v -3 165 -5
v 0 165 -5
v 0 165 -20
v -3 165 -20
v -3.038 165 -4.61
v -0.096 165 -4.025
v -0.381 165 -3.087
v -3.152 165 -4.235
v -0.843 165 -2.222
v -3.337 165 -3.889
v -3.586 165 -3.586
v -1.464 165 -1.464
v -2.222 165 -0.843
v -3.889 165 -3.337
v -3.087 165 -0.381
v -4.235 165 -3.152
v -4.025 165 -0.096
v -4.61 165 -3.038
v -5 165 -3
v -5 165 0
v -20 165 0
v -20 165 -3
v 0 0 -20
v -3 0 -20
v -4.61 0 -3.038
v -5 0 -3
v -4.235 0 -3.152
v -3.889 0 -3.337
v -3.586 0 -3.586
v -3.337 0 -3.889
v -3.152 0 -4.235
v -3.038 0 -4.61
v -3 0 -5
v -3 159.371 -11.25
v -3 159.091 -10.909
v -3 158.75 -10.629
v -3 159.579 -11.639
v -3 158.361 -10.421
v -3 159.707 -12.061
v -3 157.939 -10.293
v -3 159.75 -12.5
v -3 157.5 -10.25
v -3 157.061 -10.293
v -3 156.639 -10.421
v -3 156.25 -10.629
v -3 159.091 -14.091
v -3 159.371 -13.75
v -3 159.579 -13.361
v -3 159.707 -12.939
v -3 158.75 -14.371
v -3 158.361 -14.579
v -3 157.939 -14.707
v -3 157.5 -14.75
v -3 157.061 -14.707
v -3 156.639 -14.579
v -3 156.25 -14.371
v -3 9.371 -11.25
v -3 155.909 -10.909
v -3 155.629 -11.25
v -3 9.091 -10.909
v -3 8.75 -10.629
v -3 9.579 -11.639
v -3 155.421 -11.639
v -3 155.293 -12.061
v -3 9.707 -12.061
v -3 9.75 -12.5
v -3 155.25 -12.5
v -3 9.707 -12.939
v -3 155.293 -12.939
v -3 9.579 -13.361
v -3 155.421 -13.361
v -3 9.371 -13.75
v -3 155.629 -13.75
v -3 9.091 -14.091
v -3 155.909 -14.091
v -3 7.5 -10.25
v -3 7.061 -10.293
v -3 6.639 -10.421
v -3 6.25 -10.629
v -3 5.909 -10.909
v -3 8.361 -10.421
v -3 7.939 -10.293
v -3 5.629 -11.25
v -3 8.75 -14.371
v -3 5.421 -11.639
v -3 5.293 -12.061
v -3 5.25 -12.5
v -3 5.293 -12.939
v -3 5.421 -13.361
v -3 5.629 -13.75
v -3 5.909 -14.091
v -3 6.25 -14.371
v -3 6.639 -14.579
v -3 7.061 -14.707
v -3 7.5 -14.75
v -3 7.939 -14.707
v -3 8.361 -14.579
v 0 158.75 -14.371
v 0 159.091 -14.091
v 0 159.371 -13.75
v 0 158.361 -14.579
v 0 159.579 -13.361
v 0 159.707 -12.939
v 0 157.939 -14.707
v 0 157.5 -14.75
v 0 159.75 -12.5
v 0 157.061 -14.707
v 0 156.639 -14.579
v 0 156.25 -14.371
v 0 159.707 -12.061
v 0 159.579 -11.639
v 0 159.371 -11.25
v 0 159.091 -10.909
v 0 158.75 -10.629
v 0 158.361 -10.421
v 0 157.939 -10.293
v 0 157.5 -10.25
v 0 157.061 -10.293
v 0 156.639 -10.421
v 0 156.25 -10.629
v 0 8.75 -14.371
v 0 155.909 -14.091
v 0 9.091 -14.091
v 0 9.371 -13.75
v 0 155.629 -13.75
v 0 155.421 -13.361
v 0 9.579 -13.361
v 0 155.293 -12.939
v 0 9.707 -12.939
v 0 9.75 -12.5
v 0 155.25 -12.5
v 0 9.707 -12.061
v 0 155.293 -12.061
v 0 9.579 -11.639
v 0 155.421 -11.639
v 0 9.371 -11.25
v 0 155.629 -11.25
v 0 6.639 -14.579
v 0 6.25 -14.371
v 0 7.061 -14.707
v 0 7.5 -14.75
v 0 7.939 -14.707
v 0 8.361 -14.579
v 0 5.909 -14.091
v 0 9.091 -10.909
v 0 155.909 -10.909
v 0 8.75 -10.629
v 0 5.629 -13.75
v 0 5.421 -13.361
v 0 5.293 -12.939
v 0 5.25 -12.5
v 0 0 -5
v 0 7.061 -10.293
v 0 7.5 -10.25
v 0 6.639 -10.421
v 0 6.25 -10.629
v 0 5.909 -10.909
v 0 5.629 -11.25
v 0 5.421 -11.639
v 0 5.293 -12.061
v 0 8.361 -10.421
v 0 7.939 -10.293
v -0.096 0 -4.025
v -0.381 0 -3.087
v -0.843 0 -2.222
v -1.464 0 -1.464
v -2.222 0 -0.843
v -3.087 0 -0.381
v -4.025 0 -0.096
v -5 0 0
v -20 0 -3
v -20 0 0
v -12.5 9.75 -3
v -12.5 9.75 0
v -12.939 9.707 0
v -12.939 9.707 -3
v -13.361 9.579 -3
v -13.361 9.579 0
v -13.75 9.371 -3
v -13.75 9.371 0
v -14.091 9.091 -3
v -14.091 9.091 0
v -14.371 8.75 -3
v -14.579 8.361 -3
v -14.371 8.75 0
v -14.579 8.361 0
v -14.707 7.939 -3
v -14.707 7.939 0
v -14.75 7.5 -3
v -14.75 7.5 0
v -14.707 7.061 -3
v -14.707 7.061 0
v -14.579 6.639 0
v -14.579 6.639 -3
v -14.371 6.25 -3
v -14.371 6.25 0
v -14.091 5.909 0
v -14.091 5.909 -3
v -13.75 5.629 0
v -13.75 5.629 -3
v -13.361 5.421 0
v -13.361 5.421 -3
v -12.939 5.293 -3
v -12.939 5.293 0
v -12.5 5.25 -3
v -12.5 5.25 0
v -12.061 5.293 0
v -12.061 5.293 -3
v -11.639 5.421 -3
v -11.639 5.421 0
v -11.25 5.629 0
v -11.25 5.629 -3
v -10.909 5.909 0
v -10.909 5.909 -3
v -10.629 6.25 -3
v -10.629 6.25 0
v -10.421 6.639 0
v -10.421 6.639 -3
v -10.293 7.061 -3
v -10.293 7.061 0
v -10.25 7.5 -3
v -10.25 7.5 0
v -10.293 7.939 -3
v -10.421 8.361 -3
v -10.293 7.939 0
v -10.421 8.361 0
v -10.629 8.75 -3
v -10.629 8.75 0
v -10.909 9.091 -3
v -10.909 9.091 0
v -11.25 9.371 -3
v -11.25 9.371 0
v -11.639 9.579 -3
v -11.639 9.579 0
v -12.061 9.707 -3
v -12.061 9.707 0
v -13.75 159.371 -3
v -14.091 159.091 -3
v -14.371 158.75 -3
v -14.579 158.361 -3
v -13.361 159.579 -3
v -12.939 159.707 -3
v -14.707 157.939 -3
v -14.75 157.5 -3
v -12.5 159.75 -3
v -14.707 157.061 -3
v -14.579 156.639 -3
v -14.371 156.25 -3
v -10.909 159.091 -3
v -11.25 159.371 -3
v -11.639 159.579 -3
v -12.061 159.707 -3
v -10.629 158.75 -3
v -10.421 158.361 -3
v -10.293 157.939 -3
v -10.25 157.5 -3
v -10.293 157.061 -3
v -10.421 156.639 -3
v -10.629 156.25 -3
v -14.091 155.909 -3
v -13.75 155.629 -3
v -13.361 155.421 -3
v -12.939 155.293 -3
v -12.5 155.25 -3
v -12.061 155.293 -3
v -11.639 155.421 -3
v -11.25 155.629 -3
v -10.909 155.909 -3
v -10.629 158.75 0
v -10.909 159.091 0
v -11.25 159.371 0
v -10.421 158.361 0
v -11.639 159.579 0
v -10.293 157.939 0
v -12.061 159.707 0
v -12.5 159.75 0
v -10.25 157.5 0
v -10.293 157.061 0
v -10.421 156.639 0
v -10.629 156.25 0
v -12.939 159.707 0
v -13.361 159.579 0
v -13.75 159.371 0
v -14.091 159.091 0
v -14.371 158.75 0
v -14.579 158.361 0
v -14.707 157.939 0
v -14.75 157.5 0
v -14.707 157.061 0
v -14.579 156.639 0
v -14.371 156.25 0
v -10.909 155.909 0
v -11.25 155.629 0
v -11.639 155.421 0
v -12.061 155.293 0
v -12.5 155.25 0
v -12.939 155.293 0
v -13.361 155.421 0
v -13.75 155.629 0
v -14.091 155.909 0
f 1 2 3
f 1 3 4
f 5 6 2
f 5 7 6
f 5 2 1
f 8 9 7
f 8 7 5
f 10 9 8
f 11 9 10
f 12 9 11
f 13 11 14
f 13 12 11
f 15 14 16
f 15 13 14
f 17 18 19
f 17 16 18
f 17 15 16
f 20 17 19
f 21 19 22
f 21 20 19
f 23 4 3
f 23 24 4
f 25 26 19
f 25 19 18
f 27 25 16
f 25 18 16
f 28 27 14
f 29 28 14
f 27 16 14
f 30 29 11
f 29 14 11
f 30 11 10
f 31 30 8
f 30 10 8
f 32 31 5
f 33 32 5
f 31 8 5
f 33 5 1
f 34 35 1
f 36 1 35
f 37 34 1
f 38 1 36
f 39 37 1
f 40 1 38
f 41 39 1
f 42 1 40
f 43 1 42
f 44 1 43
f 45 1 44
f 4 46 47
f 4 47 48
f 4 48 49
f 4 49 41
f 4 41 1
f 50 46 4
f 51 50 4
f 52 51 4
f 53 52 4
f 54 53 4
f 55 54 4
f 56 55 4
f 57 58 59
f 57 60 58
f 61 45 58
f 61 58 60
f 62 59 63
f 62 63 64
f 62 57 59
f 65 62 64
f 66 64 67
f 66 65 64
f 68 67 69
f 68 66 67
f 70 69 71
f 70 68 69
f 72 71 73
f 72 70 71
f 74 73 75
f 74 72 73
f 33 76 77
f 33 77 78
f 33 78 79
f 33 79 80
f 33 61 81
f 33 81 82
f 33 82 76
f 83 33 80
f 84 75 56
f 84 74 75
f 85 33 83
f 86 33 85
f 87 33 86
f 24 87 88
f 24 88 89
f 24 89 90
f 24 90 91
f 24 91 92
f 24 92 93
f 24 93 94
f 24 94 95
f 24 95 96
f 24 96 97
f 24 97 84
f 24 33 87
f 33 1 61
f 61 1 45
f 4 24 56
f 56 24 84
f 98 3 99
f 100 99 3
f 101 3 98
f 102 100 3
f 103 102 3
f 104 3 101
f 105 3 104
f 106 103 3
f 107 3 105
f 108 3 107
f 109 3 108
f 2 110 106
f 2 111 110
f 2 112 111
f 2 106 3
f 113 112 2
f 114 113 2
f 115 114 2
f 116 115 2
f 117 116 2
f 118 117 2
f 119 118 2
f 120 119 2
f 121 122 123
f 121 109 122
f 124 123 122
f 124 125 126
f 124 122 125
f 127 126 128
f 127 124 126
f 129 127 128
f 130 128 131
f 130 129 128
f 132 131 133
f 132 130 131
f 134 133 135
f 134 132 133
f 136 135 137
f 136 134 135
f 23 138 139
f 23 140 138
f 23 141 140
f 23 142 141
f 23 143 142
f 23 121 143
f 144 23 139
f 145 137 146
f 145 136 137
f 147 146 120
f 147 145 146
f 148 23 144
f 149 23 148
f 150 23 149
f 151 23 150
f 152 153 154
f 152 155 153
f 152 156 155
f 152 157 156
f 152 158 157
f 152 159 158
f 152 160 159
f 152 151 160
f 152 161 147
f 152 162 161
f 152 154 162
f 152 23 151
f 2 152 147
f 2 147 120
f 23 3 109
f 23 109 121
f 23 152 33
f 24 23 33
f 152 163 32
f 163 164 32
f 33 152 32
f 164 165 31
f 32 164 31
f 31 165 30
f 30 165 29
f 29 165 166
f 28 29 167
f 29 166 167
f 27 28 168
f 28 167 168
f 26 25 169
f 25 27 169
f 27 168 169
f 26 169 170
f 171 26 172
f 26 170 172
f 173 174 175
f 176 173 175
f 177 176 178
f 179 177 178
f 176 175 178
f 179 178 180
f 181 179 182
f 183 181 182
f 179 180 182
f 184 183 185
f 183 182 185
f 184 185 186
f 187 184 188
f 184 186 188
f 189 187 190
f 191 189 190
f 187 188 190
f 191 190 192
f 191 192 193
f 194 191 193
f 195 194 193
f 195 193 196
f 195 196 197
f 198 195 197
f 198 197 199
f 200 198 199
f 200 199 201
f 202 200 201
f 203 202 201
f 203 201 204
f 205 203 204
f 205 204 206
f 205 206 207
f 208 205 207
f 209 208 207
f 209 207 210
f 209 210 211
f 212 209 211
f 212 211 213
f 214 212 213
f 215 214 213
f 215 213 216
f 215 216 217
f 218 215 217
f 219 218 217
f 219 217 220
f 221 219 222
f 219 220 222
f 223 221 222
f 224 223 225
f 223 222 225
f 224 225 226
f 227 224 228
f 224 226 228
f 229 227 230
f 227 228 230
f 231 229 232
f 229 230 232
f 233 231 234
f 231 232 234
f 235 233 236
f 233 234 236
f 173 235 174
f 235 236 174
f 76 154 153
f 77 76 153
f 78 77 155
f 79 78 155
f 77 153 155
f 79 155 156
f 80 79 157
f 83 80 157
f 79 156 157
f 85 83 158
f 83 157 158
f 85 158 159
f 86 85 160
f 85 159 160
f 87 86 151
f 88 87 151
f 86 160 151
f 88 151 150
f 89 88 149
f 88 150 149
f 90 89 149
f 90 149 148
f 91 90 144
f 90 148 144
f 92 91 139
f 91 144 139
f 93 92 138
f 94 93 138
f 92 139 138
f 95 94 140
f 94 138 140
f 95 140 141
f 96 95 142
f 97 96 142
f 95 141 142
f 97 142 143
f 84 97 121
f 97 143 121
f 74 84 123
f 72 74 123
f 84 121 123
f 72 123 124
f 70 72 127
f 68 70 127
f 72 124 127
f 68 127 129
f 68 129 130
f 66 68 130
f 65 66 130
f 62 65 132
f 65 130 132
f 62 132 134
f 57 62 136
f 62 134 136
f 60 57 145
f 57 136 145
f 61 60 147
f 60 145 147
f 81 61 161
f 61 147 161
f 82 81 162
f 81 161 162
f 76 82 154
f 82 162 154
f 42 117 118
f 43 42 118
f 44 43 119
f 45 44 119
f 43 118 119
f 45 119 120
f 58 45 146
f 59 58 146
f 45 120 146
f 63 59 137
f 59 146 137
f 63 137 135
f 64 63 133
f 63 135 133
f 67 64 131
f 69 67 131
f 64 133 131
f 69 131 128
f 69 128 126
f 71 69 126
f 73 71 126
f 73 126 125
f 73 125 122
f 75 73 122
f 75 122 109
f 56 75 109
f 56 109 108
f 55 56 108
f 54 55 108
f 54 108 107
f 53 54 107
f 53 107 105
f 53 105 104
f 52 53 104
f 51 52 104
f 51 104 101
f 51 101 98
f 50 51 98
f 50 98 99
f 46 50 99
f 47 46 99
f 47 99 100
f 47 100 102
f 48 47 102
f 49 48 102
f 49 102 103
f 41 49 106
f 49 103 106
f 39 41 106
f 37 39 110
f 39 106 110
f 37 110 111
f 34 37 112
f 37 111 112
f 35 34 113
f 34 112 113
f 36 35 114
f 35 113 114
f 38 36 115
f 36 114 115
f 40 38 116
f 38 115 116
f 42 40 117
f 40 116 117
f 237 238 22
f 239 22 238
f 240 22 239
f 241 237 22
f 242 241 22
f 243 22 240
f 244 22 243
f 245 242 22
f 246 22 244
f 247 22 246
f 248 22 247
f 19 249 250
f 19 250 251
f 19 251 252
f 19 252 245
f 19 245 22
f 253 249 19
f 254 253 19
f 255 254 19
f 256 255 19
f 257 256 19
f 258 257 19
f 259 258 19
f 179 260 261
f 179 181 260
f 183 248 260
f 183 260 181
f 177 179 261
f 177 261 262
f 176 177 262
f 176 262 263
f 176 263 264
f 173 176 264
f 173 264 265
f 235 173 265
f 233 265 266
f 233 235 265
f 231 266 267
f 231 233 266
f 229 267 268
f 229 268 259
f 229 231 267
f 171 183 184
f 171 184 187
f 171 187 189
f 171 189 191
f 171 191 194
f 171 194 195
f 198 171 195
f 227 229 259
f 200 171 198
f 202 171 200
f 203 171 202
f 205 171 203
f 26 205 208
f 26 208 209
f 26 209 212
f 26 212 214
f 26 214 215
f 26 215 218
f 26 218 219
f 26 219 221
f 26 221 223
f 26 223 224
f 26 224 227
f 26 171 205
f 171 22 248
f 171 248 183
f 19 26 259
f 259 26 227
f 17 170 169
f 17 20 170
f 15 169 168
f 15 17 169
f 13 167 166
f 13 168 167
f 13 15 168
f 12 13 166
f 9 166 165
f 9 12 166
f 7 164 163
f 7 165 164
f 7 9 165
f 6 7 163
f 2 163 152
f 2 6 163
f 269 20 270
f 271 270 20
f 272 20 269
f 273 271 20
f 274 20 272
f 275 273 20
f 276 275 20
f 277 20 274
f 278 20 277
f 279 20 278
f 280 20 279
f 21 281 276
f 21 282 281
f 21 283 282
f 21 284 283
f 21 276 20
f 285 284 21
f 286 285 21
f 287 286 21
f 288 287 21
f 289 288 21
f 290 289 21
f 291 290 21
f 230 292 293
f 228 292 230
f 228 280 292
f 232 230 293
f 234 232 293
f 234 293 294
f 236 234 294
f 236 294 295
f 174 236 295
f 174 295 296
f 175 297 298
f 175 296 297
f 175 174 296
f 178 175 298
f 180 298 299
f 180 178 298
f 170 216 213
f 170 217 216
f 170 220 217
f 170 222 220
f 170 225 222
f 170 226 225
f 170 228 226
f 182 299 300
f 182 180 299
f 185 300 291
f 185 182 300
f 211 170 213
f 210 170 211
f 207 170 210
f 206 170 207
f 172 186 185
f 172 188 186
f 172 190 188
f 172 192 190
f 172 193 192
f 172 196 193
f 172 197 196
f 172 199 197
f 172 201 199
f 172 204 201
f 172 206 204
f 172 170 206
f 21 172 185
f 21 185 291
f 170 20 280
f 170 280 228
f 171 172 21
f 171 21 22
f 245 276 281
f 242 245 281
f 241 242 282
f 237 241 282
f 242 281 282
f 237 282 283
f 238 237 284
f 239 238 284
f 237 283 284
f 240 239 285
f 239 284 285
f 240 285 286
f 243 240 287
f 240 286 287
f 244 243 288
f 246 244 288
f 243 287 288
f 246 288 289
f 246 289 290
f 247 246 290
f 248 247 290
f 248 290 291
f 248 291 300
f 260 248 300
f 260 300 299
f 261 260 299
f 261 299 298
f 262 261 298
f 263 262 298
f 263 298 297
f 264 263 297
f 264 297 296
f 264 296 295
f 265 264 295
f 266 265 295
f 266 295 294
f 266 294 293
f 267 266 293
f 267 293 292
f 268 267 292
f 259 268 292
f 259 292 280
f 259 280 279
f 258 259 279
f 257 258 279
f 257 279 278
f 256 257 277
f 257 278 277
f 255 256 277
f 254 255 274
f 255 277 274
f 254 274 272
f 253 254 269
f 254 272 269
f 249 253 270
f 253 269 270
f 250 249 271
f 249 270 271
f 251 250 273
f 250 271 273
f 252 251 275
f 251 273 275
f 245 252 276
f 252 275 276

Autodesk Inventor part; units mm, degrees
ref_plane "YZ Plane" through (0, 0, 0) normal (1, 0, 0) x (0, 1, 0)
ref_plane "XZ Plane" through (0, 0, 0) normal (0, 1, 0) x (-1, 0, 0)
ref_plane "XY Plane" through (0, 0, 0) normal (0, 0, 1) x (1, 0, 0)
sketch "Sketch1" plane through (0, 0, 0) normal (0, 1, 0) x (-1, 0, 0)
  line L0 (0, 0) -> (20, 0)
  line L1 (20, 0) -> (20, -3)
  line L2 (20, -3) -> (0, -3)
  line L3 (0, -3) -> (0, 0)
  line L4 (0, 0) -> (3, 0)
  line L5 (3, 0) -> (3, -20)
  line L6 (3, -20) -> (0, -20)
  line L7 (0, -20) -> (0, 0)
  dimension "d0" = 3
  dimension "d1" = 3
  dimension "d2" = 20
  dimension "d3" = 20
extrude "Extrusion1" add sketch "Sketch1" along normal blind 165
fillet "Fillet1" radius 2 1 edges at (-3, 82.5, -3)
fillet "Fillet2" radius 5 1 edges at (0, 82.5, 0)
sketch "Sketch2" plane through (-3, 0, -20) normal (-1, 0, 0) x (0, 0, 1)
  line L0 (0, 165) -> (15, 165) projected
  line L1 (0, 0) -> (15, 0) projected
  line L2 (0, 0) -> (0, 165) projected
  point P0 (20, 0)
  point P1 (7.5, 157.5)
  point P2 (7.5, 7.5)
  dimension "d8" = 7.5
  dimension "d9" = 7.5
  dimension "d10" = 150
  dimension "d11" = 7.5
hole "Hole1" at (-3, 157.5, -12.5) at (-3, 7.5, -12.5) direction (1, 0, 0) diameter 4.5 end through all clearance for "Socket Head Cap Screw" size "M4" standard "Ansi Metric M Profile"
sketch "Sketch3" plane through (-20, 0, -3) normal (0, 0, -1) x (-1, 0, 0)
  line L0 (-15, 165) -> (0, 165) projected
  line L1 (-15, 0) -> (0, 0) projected
  line L2 (0, 0) -> (0, 165) projected
  point P0 (-20, 0)
  point P1 (-7.5, 157.5)
  point P2 (-7.5, 7.5)
  dimension "d19" = 7.5
  dimension "d20" = 7.5
  dimension "d21" = 7.5
  dimension "d29" = 150
hole "Hole2" at (-12.5, 157.5, -3) at (-12.5, 7.5, -3) direction (0, 0, 1) diameter 4.5 end through all clearance for "Socket Head Cap Screw" size "M4" standard "Ansi Metric M Profile"
equation "\"d1\" = d0"
equation "\"d3\" = d2"
equation "\"d9\" = d8"
equation "\"d20\" = d19"
equation "\"d21\" = d19"
properties part number "Top_Angle Bracket" material "Aluminum 6061"
